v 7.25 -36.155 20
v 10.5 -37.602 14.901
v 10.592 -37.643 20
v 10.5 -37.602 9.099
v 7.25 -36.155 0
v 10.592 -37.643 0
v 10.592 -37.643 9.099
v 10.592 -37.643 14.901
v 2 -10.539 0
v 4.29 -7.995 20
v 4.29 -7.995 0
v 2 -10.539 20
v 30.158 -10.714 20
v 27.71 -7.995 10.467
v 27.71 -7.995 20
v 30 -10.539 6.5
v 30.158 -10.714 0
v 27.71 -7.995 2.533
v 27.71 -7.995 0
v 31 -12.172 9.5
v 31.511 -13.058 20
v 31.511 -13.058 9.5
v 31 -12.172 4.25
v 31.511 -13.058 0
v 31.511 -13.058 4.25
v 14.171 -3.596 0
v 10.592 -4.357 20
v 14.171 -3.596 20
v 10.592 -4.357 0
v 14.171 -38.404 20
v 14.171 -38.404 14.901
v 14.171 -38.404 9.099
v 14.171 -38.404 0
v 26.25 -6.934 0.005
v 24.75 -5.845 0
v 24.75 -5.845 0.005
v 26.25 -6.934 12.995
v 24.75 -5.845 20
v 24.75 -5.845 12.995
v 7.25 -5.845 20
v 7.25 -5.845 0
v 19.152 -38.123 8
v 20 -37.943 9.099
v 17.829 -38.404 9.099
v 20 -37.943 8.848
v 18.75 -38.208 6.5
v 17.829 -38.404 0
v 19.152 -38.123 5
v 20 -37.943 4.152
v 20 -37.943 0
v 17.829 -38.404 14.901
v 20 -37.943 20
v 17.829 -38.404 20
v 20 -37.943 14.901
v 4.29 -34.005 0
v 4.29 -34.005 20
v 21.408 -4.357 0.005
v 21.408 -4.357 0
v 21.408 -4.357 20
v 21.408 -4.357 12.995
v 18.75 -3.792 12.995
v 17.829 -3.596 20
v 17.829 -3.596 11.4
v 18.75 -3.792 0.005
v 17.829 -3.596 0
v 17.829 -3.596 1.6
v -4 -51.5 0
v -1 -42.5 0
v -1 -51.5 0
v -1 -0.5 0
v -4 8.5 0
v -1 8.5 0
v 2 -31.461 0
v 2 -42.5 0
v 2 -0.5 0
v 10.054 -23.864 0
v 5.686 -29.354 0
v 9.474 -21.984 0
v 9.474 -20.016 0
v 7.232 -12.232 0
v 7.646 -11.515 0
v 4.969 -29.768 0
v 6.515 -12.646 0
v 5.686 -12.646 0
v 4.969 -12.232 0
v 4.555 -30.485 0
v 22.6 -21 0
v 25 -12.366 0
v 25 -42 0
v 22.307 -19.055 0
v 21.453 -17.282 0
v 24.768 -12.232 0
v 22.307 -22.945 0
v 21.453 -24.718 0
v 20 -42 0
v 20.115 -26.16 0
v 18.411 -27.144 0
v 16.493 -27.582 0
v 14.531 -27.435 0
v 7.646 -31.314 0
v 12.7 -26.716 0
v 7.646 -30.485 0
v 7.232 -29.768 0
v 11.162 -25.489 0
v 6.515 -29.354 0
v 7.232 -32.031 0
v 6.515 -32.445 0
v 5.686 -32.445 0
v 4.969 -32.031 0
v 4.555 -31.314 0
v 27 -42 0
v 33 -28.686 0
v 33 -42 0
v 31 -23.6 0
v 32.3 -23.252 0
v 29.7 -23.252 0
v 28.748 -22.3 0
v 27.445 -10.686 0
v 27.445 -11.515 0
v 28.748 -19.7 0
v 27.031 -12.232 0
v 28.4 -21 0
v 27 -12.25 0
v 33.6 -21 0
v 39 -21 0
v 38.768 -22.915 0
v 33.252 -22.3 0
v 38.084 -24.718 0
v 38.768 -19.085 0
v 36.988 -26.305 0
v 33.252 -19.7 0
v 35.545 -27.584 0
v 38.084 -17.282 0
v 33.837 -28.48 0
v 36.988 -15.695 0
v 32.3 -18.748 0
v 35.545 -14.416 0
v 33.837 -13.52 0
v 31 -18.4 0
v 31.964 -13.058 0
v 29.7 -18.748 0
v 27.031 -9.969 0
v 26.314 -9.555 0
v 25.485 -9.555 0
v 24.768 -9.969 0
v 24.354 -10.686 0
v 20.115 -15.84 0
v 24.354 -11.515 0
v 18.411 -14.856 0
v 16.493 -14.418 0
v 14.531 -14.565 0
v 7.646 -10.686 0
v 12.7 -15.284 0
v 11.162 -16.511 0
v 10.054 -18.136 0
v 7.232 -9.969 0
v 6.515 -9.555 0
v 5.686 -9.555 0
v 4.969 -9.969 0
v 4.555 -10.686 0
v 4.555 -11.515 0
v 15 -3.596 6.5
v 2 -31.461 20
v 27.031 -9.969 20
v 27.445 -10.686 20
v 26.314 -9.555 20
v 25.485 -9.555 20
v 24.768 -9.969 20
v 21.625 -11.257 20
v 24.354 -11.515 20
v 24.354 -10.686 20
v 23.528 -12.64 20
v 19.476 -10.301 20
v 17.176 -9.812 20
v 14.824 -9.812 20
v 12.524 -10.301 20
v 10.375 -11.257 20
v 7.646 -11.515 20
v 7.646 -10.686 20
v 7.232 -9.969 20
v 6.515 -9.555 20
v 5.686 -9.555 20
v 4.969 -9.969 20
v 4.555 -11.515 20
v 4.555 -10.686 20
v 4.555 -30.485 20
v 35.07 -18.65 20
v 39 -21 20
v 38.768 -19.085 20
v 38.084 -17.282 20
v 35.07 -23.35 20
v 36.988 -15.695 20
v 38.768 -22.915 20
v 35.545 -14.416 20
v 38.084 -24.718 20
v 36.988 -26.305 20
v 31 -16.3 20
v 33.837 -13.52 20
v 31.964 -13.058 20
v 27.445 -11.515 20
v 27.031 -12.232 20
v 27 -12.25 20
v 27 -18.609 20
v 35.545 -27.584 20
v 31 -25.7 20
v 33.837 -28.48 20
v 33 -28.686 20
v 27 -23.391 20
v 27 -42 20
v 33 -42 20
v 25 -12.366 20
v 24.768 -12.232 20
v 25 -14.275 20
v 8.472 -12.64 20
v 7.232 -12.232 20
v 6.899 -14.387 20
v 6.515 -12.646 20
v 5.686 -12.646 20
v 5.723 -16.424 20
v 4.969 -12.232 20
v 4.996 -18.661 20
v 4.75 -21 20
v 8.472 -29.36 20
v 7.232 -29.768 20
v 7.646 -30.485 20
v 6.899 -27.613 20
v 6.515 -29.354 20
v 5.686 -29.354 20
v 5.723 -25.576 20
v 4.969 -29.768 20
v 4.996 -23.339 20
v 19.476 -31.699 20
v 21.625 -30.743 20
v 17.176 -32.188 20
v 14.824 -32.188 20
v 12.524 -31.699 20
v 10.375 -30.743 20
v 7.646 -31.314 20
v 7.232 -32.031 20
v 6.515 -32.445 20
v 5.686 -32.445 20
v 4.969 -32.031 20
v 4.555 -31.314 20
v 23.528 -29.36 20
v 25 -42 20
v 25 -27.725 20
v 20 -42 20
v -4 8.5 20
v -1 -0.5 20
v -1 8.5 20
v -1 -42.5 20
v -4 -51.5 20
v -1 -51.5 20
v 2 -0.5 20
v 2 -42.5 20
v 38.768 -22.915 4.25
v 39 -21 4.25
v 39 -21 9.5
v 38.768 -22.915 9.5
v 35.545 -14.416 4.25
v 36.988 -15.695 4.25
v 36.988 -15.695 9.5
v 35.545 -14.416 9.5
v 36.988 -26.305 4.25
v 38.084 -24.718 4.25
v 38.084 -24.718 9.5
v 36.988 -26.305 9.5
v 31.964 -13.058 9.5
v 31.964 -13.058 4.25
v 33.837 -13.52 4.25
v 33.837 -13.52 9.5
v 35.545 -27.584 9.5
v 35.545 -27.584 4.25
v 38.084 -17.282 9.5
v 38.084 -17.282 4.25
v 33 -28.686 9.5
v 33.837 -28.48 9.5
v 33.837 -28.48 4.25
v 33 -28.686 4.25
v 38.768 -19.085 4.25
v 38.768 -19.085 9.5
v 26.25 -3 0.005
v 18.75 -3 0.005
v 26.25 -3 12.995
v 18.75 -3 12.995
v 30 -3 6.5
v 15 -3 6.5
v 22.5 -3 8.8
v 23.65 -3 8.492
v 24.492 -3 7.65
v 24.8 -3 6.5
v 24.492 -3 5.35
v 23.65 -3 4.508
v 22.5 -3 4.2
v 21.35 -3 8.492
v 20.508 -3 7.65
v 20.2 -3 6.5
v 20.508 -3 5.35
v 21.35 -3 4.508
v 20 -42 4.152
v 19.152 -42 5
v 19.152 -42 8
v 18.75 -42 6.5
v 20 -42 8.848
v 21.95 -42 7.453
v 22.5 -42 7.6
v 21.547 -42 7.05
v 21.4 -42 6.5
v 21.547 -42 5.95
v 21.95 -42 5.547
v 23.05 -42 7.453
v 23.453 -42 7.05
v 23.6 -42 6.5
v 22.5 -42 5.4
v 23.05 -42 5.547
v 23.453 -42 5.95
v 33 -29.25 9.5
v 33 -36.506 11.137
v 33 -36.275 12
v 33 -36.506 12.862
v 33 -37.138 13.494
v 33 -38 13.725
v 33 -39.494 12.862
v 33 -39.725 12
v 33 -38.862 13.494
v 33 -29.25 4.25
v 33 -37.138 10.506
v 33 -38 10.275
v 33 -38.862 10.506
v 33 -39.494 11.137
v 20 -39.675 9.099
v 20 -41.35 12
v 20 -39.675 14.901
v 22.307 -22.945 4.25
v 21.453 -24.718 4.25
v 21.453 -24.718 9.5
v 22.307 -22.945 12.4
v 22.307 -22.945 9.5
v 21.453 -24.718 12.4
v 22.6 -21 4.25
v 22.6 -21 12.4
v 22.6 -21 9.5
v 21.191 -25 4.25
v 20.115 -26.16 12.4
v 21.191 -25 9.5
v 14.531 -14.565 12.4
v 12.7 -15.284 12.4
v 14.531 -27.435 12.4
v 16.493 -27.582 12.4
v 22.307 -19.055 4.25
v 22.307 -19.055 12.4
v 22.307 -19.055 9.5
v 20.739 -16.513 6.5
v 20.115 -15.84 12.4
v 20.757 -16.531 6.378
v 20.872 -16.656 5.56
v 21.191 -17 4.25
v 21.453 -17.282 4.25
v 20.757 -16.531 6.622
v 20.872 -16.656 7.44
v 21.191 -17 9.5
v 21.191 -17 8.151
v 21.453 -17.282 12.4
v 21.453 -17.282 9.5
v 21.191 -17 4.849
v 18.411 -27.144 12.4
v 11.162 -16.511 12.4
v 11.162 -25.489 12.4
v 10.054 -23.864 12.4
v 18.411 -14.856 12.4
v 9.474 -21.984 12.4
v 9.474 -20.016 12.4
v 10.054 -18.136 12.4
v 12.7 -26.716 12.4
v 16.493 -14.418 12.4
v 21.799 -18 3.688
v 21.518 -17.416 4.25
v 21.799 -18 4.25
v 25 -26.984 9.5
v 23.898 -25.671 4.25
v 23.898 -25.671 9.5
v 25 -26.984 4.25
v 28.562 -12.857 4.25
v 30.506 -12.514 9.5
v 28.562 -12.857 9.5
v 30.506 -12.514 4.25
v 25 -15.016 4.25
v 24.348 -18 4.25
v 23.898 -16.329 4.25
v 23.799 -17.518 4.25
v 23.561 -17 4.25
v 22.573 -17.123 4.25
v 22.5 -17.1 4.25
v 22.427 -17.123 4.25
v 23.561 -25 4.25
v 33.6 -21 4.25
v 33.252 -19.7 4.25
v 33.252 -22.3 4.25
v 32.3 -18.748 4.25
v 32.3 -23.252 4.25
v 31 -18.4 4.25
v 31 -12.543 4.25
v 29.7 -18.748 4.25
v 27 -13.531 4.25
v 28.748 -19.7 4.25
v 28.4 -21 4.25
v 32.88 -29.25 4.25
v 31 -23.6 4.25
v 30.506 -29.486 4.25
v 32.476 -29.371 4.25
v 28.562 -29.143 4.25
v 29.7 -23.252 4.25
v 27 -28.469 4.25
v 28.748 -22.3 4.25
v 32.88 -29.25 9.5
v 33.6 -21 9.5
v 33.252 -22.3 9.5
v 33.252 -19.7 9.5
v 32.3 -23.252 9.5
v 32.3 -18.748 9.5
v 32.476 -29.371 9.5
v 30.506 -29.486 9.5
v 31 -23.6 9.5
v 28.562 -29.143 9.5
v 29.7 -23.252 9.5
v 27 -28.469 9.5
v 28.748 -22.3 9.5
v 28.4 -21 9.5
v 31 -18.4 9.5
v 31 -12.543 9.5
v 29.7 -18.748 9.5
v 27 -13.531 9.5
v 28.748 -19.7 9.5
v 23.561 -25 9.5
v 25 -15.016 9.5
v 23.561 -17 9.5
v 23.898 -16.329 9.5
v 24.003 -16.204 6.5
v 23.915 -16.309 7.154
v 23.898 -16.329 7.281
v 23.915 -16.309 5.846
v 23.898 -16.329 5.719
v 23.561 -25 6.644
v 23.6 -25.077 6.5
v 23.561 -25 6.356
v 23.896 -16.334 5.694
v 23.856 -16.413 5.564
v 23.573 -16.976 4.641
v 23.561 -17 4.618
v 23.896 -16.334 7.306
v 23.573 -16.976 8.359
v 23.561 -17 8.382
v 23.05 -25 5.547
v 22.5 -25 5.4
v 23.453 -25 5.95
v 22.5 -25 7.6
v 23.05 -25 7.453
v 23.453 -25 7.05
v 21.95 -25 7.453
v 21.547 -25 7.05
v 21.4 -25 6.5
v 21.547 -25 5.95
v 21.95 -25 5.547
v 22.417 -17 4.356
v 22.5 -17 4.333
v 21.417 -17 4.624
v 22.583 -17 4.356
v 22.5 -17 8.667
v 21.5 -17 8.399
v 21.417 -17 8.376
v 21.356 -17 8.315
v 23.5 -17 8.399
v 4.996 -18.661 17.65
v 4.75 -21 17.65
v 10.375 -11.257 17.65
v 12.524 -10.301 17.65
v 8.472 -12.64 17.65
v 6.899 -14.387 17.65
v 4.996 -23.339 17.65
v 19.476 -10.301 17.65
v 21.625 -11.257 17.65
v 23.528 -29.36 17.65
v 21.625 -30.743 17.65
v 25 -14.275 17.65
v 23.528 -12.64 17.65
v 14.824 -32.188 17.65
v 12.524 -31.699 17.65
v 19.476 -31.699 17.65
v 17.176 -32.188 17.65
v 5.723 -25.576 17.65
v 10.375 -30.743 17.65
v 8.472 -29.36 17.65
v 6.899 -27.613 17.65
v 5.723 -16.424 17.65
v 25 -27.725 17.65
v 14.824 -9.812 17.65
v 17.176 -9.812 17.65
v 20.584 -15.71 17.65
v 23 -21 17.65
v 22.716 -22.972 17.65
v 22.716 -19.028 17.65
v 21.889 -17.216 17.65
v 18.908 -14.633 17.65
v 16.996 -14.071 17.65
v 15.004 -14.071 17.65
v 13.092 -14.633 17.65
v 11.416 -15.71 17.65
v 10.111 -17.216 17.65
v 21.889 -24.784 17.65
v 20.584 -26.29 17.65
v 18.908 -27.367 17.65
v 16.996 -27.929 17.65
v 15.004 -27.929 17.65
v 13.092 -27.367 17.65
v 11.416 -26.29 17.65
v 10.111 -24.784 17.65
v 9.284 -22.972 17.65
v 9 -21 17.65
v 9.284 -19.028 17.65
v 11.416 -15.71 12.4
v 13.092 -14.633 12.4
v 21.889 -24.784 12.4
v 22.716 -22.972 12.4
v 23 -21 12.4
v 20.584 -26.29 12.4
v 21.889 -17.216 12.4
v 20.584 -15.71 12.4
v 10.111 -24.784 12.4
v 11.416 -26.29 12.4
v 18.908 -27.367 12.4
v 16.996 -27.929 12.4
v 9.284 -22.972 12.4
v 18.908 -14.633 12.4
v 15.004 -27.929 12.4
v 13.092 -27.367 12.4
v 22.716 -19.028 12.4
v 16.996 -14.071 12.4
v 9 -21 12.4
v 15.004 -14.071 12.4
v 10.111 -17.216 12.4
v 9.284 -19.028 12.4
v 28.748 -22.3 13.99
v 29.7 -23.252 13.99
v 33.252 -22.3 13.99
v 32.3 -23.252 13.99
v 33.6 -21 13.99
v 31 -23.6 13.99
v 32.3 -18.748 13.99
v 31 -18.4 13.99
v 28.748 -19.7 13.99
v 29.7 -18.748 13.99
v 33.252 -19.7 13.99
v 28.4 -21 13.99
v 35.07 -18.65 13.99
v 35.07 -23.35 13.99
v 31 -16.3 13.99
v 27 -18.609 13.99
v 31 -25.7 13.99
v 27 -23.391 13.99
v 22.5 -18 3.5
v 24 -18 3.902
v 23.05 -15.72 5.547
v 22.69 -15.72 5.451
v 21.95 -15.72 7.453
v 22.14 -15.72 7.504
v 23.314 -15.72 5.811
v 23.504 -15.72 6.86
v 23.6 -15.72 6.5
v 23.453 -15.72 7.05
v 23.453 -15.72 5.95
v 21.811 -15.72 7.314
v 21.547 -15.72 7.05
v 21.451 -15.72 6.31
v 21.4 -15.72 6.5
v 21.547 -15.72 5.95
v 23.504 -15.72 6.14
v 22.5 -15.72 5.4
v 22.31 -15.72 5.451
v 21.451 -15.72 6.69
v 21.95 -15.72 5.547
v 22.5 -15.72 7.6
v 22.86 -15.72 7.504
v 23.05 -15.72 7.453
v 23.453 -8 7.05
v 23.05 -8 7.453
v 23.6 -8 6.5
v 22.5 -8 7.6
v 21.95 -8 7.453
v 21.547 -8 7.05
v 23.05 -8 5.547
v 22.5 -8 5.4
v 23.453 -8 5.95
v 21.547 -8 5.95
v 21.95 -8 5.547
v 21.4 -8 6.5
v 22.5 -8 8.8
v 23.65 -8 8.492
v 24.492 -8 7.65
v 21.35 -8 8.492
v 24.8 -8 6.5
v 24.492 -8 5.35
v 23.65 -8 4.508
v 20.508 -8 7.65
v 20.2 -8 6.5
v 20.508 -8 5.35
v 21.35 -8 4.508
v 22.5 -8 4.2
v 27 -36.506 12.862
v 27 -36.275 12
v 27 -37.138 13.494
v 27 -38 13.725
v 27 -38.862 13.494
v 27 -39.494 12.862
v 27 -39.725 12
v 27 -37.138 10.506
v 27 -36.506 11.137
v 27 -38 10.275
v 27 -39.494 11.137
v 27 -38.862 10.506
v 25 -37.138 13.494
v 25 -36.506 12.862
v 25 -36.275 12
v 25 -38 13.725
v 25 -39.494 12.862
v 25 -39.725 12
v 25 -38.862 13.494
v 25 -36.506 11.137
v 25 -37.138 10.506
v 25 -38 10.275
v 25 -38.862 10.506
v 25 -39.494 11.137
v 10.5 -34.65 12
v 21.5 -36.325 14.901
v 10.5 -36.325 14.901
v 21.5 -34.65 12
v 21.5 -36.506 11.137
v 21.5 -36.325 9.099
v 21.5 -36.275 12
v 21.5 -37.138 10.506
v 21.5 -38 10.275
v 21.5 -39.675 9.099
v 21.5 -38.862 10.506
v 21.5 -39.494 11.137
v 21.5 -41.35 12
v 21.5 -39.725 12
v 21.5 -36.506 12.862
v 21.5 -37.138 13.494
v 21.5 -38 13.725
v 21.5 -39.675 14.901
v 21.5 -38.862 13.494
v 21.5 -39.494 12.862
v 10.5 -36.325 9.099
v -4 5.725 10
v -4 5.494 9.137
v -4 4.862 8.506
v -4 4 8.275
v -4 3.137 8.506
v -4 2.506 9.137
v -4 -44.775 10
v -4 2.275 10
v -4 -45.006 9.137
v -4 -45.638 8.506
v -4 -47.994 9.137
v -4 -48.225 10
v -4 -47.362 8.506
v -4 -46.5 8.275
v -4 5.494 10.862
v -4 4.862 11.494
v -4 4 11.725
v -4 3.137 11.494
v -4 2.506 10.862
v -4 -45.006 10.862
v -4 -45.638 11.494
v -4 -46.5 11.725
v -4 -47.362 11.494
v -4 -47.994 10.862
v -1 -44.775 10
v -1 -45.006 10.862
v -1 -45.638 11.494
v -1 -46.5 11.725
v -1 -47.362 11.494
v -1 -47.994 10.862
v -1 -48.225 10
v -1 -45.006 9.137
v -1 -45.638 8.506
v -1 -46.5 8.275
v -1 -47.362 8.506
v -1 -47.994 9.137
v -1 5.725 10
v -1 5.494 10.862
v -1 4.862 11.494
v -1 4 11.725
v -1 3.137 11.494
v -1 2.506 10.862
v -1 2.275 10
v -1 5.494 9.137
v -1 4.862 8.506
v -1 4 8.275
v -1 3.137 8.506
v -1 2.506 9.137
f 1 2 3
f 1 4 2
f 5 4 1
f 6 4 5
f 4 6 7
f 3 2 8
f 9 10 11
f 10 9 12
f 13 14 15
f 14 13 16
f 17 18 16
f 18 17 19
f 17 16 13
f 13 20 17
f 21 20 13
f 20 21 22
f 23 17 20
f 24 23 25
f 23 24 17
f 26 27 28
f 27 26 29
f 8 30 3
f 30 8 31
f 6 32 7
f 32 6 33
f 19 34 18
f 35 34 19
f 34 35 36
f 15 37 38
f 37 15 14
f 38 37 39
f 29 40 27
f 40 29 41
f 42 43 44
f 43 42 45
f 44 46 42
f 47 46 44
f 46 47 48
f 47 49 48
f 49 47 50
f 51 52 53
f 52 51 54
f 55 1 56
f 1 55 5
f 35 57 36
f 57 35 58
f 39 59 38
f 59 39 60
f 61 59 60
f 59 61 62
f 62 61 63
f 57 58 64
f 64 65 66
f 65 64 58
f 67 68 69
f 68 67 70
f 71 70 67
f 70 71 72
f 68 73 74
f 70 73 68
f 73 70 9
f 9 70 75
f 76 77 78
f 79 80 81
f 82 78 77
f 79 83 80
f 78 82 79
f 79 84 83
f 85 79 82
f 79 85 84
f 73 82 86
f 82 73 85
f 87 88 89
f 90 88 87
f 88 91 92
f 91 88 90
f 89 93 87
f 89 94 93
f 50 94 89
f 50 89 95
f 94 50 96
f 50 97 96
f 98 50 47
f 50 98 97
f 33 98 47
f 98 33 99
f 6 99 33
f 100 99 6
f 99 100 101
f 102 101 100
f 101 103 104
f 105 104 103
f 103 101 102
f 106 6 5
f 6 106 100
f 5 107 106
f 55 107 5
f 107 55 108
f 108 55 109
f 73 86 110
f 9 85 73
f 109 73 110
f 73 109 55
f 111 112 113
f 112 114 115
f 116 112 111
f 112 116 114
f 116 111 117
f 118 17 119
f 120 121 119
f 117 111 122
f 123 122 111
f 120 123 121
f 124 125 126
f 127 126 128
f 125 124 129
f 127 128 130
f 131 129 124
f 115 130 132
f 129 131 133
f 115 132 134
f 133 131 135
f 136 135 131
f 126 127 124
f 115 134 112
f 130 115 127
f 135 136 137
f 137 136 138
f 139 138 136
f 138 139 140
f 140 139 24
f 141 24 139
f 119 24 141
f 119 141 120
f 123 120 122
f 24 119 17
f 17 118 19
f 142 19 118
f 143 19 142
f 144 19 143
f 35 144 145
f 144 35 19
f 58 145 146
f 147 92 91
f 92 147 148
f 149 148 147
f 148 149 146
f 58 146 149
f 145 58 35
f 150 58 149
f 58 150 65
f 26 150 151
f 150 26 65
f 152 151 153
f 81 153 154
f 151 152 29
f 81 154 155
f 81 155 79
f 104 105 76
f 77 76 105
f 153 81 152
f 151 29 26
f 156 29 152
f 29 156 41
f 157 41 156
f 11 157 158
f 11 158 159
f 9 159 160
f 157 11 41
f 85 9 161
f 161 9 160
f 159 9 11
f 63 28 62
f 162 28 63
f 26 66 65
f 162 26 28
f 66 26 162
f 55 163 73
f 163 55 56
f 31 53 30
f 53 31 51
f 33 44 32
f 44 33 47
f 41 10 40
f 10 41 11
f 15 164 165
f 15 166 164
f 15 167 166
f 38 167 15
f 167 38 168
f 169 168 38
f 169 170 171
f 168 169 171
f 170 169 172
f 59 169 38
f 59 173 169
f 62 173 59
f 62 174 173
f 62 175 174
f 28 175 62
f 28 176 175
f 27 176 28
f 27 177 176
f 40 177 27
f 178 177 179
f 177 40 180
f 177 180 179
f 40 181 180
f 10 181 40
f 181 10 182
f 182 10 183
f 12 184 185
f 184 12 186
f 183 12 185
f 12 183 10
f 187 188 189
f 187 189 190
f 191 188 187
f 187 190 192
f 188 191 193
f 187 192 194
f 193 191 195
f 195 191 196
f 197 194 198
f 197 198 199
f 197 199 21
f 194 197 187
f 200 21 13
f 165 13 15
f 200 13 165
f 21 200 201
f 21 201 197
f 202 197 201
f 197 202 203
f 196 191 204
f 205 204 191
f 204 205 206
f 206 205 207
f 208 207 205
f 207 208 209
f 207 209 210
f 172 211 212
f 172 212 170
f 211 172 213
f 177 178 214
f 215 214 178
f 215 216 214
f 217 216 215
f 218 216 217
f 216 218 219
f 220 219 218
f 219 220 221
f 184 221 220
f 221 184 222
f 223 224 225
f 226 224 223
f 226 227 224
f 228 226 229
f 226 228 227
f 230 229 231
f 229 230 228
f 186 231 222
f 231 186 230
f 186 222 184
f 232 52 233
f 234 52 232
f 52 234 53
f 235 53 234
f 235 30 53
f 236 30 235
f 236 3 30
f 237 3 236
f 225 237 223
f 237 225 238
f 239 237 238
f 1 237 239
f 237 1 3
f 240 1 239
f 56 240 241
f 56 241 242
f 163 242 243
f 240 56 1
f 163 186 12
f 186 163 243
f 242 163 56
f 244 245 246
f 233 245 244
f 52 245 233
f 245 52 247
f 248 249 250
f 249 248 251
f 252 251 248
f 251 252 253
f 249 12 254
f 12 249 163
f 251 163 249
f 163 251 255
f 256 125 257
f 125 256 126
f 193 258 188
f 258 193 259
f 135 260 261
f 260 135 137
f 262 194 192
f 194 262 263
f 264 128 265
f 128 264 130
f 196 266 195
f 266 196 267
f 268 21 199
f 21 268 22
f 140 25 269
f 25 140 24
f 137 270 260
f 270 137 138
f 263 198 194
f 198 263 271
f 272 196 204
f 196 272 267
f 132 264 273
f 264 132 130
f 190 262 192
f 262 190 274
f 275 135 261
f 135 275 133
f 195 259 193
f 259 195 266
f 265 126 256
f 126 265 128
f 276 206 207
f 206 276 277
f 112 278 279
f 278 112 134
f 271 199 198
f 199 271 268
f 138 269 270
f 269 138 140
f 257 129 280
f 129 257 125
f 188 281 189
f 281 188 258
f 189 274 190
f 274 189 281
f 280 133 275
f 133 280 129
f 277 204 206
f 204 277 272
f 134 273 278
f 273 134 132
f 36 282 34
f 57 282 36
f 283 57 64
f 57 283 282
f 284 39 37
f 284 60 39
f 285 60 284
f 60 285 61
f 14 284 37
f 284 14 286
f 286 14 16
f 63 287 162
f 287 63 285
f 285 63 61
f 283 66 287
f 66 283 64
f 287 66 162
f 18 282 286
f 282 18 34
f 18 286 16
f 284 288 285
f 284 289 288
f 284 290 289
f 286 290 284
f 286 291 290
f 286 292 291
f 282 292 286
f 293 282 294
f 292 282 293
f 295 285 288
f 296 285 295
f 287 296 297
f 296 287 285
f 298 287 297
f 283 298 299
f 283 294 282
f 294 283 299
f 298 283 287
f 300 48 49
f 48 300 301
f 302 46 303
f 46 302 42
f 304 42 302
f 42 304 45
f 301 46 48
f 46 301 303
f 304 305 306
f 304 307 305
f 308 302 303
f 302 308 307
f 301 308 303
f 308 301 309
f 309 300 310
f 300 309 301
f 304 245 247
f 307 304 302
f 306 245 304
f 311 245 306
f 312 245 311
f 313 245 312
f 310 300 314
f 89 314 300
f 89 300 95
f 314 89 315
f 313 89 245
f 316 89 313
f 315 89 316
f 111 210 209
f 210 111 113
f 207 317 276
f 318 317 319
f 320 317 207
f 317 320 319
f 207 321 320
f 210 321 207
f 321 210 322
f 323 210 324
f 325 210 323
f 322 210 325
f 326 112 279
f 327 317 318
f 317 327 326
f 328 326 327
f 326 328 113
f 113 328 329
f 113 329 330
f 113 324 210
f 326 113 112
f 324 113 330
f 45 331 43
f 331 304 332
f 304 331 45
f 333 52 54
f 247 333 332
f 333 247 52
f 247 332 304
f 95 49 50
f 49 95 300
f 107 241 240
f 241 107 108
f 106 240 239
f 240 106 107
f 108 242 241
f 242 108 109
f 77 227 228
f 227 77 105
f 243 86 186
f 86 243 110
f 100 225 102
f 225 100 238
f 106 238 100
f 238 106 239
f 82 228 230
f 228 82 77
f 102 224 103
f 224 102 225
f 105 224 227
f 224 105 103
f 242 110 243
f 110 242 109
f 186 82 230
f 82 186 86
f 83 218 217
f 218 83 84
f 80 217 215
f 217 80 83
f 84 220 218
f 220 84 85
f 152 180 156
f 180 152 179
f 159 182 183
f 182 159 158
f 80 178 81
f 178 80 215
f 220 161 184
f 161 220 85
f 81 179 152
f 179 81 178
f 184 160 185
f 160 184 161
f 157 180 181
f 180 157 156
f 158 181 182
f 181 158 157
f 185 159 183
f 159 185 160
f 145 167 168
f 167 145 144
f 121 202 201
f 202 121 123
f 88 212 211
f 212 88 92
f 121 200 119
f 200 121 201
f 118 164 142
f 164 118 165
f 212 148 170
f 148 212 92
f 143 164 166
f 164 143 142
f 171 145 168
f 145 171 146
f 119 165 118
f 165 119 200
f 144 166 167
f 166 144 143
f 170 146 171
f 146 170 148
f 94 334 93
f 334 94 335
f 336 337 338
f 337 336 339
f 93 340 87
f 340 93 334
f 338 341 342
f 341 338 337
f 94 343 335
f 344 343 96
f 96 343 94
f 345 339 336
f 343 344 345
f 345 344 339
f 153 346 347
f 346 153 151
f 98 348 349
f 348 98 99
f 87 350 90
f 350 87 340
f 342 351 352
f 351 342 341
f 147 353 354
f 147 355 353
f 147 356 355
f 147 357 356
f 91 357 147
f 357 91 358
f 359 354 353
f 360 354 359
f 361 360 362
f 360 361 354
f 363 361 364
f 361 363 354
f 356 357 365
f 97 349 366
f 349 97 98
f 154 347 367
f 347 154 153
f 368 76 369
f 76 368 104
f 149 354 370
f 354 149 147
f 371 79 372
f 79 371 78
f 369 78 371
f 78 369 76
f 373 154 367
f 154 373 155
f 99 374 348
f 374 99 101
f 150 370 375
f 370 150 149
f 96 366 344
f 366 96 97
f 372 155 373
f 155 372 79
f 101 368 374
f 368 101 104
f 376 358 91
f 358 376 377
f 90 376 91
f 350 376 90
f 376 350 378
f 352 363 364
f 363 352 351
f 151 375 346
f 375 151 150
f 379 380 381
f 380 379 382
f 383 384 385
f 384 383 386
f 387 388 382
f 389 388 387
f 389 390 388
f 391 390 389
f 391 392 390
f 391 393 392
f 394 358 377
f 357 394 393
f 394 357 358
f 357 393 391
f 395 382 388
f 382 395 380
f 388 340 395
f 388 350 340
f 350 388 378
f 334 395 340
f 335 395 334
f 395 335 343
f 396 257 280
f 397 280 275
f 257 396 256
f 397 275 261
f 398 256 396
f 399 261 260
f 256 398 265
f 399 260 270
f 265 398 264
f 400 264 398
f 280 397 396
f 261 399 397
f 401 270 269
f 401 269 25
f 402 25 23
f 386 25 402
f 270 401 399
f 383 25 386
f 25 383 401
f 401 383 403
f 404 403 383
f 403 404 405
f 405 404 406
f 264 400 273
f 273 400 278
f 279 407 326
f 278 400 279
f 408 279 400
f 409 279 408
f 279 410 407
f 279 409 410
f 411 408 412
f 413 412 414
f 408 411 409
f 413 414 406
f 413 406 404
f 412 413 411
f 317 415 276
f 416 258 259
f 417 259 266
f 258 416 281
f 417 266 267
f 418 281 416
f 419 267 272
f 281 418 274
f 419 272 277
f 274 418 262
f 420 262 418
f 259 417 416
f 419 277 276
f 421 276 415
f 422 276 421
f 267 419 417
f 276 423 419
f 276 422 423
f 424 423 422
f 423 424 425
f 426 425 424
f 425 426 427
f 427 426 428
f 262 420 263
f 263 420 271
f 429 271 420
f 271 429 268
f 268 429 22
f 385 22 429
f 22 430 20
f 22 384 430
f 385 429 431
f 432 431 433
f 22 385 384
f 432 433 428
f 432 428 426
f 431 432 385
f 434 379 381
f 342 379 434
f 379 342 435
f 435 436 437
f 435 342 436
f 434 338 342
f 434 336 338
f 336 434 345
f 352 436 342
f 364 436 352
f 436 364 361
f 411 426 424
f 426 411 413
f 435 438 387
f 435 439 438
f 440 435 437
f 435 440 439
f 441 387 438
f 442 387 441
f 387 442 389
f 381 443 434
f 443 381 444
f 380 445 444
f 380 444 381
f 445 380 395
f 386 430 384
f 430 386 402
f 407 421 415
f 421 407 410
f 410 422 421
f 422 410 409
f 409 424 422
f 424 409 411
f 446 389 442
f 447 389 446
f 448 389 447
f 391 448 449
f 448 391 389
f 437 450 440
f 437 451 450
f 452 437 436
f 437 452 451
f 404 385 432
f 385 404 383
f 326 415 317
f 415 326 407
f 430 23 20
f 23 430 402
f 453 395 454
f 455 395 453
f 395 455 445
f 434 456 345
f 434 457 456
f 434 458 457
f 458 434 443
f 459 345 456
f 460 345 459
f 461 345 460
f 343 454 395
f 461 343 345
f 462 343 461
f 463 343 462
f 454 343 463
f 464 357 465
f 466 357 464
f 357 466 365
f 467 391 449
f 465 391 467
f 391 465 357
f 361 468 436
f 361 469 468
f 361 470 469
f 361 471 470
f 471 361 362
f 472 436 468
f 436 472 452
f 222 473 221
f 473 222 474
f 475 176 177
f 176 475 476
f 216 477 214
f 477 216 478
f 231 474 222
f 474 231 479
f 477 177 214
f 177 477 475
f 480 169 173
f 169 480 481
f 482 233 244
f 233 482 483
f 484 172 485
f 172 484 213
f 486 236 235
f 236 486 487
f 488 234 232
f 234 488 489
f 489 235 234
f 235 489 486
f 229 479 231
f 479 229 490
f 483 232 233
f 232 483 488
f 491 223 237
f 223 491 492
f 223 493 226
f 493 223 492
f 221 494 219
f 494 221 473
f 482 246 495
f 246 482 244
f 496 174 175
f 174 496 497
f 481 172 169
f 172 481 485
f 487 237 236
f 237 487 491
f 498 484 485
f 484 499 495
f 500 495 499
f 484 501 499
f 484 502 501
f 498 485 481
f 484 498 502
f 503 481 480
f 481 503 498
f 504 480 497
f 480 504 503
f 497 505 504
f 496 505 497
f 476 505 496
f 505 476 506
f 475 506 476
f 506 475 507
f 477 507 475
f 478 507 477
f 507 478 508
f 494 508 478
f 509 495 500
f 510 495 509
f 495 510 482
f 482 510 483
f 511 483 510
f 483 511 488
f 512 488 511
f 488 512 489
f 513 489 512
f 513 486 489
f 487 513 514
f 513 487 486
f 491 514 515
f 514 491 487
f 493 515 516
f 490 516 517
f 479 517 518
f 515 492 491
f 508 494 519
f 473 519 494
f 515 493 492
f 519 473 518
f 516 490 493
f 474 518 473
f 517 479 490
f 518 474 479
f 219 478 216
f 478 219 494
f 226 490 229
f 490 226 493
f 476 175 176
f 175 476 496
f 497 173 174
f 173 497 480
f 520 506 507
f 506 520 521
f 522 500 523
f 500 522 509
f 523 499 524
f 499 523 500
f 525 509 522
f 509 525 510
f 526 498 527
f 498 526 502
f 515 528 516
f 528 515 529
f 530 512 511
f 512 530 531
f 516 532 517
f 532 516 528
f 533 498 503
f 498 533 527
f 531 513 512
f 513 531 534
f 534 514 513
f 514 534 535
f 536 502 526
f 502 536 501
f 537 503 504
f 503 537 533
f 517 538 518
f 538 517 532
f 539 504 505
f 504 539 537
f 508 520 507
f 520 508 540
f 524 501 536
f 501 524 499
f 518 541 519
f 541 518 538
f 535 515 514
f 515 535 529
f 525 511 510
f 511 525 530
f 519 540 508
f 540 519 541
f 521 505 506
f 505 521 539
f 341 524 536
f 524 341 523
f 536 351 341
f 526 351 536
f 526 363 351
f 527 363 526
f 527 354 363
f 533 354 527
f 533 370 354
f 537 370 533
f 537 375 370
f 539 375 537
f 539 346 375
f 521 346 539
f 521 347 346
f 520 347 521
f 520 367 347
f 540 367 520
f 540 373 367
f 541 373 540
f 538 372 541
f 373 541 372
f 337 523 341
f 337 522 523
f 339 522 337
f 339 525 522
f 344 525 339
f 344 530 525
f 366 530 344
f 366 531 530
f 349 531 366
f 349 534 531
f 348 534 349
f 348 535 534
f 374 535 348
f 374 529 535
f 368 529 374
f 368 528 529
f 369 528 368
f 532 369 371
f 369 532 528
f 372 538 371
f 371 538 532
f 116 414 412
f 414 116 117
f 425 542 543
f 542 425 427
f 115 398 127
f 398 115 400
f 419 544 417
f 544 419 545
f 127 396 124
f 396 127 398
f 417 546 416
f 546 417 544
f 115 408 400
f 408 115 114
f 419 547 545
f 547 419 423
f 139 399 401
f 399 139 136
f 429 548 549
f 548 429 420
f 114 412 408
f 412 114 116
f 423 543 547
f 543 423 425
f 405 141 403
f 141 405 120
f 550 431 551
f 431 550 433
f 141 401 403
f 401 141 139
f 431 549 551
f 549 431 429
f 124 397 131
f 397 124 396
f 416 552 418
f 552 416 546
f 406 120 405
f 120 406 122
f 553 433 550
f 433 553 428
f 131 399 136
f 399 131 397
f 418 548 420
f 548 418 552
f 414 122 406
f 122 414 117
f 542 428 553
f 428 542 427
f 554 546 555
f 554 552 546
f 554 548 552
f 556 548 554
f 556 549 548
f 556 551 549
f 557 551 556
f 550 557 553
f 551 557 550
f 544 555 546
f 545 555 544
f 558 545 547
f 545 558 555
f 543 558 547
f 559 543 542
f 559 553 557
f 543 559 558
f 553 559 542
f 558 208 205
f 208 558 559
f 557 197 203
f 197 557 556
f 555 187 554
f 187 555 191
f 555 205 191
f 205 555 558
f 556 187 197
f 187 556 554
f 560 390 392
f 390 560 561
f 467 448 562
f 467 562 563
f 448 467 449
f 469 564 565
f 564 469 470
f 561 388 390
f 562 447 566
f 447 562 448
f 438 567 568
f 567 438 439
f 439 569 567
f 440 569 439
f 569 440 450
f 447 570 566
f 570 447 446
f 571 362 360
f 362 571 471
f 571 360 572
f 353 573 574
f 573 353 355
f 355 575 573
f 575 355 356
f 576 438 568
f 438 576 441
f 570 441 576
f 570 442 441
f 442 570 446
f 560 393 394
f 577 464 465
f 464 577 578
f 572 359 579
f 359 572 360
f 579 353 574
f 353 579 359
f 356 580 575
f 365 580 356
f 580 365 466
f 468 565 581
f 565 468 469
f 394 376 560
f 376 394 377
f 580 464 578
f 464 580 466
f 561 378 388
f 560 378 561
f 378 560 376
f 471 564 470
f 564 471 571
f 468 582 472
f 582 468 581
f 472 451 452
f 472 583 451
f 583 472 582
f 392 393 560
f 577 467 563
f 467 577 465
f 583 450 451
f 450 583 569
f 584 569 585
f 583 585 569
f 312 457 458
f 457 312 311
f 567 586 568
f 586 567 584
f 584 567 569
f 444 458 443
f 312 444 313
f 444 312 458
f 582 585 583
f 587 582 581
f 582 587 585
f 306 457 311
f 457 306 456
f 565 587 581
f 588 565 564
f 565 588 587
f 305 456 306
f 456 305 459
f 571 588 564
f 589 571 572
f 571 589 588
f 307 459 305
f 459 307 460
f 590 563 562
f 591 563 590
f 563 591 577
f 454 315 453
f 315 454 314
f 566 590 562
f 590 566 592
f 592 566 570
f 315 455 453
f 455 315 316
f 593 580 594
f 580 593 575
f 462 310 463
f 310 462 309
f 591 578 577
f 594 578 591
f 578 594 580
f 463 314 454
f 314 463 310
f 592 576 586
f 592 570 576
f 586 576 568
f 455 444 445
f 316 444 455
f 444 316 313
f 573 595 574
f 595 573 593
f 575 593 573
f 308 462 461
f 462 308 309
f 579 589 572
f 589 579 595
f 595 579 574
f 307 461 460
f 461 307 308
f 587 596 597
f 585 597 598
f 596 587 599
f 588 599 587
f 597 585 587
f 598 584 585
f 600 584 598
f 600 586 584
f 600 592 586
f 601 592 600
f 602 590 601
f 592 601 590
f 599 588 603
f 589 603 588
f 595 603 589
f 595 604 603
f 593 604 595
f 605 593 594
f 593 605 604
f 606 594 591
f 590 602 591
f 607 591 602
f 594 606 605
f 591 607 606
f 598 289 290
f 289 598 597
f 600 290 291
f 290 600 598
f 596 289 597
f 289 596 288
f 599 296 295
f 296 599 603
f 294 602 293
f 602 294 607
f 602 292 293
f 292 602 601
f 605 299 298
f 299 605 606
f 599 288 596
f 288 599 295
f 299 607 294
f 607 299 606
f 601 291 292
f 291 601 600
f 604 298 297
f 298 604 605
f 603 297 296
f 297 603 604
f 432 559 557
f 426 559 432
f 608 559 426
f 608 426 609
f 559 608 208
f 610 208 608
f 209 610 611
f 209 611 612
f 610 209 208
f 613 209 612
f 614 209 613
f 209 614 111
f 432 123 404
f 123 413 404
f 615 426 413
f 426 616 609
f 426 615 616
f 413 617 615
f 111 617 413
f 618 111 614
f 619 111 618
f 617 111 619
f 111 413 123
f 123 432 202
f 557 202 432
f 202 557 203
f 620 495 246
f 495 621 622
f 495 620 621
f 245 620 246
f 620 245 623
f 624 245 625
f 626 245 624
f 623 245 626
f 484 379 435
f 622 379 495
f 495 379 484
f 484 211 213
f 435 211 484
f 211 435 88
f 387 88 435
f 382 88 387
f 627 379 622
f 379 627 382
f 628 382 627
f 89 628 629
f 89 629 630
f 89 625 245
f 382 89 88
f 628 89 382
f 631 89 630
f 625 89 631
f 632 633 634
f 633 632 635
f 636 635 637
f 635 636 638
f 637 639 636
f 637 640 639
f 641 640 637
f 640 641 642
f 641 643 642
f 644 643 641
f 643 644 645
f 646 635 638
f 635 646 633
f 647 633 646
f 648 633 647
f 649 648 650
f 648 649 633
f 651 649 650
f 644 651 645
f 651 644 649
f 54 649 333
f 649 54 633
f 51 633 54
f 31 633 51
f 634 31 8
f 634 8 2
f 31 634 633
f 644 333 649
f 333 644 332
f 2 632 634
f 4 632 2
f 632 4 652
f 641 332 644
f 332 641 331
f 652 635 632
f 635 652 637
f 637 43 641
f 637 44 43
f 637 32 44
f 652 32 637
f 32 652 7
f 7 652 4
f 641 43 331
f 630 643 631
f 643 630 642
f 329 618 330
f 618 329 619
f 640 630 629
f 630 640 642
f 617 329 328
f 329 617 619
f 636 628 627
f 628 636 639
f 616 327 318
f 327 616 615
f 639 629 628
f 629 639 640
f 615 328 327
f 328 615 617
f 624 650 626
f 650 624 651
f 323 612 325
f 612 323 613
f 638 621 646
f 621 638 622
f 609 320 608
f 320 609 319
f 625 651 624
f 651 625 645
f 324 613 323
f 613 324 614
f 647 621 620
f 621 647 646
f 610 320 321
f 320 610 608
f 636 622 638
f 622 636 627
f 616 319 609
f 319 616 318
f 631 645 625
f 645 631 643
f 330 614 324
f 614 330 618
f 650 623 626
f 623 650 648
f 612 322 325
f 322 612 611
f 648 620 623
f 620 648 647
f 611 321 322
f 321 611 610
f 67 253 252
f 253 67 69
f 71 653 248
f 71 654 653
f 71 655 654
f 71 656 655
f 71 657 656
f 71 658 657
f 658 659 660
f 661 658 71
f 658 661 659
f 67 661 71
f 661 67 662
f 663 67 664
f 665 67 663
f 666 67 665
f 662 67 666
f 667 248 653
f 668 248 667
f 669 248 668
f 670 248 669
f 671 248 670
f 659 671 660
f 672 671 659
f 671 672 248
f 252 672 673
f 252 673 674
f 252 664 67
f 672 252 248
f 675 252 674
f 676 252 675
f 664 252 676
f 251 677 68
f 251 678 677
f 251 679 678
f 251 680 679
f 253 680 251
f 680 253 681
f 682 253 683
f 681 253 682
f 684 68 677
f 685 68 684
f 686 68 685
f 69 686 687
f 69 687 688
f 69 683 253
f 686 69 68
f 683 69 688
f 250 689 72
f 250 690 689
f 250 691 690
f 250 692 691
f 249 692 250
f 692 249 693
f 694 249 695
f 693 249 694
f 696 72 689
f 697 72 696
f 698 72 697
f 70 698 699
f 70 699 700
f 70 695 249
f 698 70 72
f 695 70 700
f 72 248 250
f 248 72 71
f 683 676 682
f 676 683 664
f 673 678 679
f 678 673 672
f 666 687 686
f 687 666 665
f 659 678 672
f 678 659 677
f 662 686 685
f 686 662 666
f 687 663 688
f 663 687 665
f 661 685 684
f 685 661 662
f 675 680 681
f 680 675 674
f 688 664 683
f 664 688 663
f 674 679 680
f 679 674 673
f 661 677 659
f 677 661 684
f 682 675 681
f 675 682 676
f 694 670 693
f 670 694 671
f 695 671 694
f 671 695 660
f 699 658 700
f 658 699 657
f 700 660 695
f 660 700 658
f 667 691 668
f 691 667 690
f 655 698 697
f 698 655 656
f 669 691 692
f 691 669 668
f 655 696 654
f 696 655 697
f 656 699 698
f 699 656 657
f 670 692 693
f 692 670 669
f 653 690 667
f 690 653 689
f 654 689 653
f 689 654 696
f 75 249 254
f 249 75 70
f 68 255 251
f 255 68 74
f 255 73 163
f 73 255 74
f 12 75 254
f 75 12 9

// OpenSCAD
// file: configuration.scad
// Increase this if your slicer or printer make holes too tight.
extra_radius = 0.1;

// OD = outside diameter, corner to corner.
m3_nut_od = 6.1;
m3_nut_radius = m3_nut_od/2 + 0.2 + extra_radius;
m3_washer_radius = 3.5 + extra_radius;

// Major diameter of metric 3mm thread.
m3_major = 2.85;
m3_radius = m3_major/2 + extra_radius;
m3_wide_radius = m3_major/2 + extra_radius + 0.2;

// NEMA17 stepper motors.
motor_shaft_diameter = 5;
motor_shaft_radius = motor_shaft_diameter/2 + extra_radius;

// Frame brackets. M3x8mm screws work best with 3.6 mm brackets.
thickness = 3.6;

// OpenBeam or Misumi. Currently only 15x15 mm, but there is a plan
// to make models more parametric and allow 20x20 mm in the future.
extrusion = 15;

// Placement for the NEMA17 stepper motors.
motor_offset = 44;
motor_length = 47;
// main file
// Based on "Makergear Filament drive goes Bowden" by Luke321
// http://www.thingiverse.com/thing:63674

include <configuration.scad>;

filament_offset = 22.5;

module mounting(){
    translate([2,-42.5,0]) rotate([0,0,90]) cube([42,4,20]);
	difference() {
  	  difference() {
	    translate([-1,-51.5,0]) rotate([0,0,90]) cube([60,3,20]);
          translate([-5,-51.5+5,0+5+5]) rotate([0,90,0]) cylinder(h=10, r=m3_wide_radius, $fn=12);
        }
          translate([-5,0+4,0+5+5]) rotate([0,90,0]) cylinder(h=10, r=m3_wide_radius, $fn=12 );
    }
    
}
module extruder() {
  rotate([90, 0, 0]) difference() {
    union() {
      //main cylinder
      translate([16,20,21]) rotate([90,0,0]) cylinder(h=20, r=17.5);

      //bearing mount
      translate([31,20,21]) rotate([90,0,0]) cylinder (h=20, r=8);

      //pushfit/pneufit mount
      translate([filament_offset, 6.5, 13])
        cylinder(r=7.5, h=20, center=true, $fn=6);

      //filament support
      translate([21.75,6.5,34]) rotate([0,0,0]) cylinder (h=8, r=3, $fn=12);

      //clamp
      translate([20, 0, 28]) cube([13, 20, 14]);
    }

    //pulley opening
    translate([16,21,21]) rotate([90,0,0]){
      cylinder (h=22, r=6.6);

      rotate([0,0,45]) {
        //translate([14,0,0]) cylinder(h=22, r=1.6, $fn=12);
        translate([0,14,0]) cylinder(h=22, r=1.6, $fn=12);
        translate([-14,0,0]) cylinder(h=22, r=1.6, $fn=12);
        translate([0,-14,0]) cylinder(h=22, r=1.6, $fn=12);
      }
    }

    //gearhead indentation
    translate([16,21,21]) rotate([90,0,0]) cylinder (h=3.35, r=11.25);

    //pulley hub indentation
    translate([16,20-2,21]) rotate([90,0,0]) cylinder (h=5.6, r=7);

    //bearing screws
    translate([31,21,21]) rotate([90,0,0]) cylinder (h=22, r=2.6, $fn=12);
    #translate([31,22,21]) rotate([90,30,0]) cylinder (h=8.01, r=4.7, $fn=6);

    //bearing
    difference() {
      union() {
        translate([31,9.5,21]) rotate([90,0,0]) cylinder (h=5.25, r=8.5);
        translate([31,9.5-5.25,21-8.25-2]) cube([20, 5.25, 18.5]);
        //opening between bearing and pulley
        translate([20,9.5-5.25,21-8.25+3.25+1]) cube([10, 5.25, 8]);
      }
      //removable supports
     // for (z = [15:3:27]) {
     //   translate([36, 10, z]) # cube([20, 20, 0.5], center=true);
     // }
    }

    //filament path chamfer
    translate([filament_offset,6.5,15]) rotate([0,0,0]) #
      cylinder(h=3, r1=0.5, r2=3, $fn=12);

    //filament path
    translate([filament_offset,6.5,-10]) rotate([0,0,0]) #
      cylinder(h=60, r=1.1, $fn=12);

    //pushfit/pneufit mount
    translate([filament_offset, 6.5, 0]) # cylinder(r=2.3, h=8, $fn=12);

    //clamp slit
    translate([25,-1,10]) cube([2, 22, 35]);
    //clamp nut
    translate([10.5,12,38]) rotate([0,90,0])
      cylinder(h=11, r=m3_nut_radius, $fn=6);
    //clamp screw hole
    translate([15,12,38]) rotate([0,90,0])
      cylinder(h=20, r=m3_wide_radius, $fn=12);
  }
  mounting();
}

extruder();
